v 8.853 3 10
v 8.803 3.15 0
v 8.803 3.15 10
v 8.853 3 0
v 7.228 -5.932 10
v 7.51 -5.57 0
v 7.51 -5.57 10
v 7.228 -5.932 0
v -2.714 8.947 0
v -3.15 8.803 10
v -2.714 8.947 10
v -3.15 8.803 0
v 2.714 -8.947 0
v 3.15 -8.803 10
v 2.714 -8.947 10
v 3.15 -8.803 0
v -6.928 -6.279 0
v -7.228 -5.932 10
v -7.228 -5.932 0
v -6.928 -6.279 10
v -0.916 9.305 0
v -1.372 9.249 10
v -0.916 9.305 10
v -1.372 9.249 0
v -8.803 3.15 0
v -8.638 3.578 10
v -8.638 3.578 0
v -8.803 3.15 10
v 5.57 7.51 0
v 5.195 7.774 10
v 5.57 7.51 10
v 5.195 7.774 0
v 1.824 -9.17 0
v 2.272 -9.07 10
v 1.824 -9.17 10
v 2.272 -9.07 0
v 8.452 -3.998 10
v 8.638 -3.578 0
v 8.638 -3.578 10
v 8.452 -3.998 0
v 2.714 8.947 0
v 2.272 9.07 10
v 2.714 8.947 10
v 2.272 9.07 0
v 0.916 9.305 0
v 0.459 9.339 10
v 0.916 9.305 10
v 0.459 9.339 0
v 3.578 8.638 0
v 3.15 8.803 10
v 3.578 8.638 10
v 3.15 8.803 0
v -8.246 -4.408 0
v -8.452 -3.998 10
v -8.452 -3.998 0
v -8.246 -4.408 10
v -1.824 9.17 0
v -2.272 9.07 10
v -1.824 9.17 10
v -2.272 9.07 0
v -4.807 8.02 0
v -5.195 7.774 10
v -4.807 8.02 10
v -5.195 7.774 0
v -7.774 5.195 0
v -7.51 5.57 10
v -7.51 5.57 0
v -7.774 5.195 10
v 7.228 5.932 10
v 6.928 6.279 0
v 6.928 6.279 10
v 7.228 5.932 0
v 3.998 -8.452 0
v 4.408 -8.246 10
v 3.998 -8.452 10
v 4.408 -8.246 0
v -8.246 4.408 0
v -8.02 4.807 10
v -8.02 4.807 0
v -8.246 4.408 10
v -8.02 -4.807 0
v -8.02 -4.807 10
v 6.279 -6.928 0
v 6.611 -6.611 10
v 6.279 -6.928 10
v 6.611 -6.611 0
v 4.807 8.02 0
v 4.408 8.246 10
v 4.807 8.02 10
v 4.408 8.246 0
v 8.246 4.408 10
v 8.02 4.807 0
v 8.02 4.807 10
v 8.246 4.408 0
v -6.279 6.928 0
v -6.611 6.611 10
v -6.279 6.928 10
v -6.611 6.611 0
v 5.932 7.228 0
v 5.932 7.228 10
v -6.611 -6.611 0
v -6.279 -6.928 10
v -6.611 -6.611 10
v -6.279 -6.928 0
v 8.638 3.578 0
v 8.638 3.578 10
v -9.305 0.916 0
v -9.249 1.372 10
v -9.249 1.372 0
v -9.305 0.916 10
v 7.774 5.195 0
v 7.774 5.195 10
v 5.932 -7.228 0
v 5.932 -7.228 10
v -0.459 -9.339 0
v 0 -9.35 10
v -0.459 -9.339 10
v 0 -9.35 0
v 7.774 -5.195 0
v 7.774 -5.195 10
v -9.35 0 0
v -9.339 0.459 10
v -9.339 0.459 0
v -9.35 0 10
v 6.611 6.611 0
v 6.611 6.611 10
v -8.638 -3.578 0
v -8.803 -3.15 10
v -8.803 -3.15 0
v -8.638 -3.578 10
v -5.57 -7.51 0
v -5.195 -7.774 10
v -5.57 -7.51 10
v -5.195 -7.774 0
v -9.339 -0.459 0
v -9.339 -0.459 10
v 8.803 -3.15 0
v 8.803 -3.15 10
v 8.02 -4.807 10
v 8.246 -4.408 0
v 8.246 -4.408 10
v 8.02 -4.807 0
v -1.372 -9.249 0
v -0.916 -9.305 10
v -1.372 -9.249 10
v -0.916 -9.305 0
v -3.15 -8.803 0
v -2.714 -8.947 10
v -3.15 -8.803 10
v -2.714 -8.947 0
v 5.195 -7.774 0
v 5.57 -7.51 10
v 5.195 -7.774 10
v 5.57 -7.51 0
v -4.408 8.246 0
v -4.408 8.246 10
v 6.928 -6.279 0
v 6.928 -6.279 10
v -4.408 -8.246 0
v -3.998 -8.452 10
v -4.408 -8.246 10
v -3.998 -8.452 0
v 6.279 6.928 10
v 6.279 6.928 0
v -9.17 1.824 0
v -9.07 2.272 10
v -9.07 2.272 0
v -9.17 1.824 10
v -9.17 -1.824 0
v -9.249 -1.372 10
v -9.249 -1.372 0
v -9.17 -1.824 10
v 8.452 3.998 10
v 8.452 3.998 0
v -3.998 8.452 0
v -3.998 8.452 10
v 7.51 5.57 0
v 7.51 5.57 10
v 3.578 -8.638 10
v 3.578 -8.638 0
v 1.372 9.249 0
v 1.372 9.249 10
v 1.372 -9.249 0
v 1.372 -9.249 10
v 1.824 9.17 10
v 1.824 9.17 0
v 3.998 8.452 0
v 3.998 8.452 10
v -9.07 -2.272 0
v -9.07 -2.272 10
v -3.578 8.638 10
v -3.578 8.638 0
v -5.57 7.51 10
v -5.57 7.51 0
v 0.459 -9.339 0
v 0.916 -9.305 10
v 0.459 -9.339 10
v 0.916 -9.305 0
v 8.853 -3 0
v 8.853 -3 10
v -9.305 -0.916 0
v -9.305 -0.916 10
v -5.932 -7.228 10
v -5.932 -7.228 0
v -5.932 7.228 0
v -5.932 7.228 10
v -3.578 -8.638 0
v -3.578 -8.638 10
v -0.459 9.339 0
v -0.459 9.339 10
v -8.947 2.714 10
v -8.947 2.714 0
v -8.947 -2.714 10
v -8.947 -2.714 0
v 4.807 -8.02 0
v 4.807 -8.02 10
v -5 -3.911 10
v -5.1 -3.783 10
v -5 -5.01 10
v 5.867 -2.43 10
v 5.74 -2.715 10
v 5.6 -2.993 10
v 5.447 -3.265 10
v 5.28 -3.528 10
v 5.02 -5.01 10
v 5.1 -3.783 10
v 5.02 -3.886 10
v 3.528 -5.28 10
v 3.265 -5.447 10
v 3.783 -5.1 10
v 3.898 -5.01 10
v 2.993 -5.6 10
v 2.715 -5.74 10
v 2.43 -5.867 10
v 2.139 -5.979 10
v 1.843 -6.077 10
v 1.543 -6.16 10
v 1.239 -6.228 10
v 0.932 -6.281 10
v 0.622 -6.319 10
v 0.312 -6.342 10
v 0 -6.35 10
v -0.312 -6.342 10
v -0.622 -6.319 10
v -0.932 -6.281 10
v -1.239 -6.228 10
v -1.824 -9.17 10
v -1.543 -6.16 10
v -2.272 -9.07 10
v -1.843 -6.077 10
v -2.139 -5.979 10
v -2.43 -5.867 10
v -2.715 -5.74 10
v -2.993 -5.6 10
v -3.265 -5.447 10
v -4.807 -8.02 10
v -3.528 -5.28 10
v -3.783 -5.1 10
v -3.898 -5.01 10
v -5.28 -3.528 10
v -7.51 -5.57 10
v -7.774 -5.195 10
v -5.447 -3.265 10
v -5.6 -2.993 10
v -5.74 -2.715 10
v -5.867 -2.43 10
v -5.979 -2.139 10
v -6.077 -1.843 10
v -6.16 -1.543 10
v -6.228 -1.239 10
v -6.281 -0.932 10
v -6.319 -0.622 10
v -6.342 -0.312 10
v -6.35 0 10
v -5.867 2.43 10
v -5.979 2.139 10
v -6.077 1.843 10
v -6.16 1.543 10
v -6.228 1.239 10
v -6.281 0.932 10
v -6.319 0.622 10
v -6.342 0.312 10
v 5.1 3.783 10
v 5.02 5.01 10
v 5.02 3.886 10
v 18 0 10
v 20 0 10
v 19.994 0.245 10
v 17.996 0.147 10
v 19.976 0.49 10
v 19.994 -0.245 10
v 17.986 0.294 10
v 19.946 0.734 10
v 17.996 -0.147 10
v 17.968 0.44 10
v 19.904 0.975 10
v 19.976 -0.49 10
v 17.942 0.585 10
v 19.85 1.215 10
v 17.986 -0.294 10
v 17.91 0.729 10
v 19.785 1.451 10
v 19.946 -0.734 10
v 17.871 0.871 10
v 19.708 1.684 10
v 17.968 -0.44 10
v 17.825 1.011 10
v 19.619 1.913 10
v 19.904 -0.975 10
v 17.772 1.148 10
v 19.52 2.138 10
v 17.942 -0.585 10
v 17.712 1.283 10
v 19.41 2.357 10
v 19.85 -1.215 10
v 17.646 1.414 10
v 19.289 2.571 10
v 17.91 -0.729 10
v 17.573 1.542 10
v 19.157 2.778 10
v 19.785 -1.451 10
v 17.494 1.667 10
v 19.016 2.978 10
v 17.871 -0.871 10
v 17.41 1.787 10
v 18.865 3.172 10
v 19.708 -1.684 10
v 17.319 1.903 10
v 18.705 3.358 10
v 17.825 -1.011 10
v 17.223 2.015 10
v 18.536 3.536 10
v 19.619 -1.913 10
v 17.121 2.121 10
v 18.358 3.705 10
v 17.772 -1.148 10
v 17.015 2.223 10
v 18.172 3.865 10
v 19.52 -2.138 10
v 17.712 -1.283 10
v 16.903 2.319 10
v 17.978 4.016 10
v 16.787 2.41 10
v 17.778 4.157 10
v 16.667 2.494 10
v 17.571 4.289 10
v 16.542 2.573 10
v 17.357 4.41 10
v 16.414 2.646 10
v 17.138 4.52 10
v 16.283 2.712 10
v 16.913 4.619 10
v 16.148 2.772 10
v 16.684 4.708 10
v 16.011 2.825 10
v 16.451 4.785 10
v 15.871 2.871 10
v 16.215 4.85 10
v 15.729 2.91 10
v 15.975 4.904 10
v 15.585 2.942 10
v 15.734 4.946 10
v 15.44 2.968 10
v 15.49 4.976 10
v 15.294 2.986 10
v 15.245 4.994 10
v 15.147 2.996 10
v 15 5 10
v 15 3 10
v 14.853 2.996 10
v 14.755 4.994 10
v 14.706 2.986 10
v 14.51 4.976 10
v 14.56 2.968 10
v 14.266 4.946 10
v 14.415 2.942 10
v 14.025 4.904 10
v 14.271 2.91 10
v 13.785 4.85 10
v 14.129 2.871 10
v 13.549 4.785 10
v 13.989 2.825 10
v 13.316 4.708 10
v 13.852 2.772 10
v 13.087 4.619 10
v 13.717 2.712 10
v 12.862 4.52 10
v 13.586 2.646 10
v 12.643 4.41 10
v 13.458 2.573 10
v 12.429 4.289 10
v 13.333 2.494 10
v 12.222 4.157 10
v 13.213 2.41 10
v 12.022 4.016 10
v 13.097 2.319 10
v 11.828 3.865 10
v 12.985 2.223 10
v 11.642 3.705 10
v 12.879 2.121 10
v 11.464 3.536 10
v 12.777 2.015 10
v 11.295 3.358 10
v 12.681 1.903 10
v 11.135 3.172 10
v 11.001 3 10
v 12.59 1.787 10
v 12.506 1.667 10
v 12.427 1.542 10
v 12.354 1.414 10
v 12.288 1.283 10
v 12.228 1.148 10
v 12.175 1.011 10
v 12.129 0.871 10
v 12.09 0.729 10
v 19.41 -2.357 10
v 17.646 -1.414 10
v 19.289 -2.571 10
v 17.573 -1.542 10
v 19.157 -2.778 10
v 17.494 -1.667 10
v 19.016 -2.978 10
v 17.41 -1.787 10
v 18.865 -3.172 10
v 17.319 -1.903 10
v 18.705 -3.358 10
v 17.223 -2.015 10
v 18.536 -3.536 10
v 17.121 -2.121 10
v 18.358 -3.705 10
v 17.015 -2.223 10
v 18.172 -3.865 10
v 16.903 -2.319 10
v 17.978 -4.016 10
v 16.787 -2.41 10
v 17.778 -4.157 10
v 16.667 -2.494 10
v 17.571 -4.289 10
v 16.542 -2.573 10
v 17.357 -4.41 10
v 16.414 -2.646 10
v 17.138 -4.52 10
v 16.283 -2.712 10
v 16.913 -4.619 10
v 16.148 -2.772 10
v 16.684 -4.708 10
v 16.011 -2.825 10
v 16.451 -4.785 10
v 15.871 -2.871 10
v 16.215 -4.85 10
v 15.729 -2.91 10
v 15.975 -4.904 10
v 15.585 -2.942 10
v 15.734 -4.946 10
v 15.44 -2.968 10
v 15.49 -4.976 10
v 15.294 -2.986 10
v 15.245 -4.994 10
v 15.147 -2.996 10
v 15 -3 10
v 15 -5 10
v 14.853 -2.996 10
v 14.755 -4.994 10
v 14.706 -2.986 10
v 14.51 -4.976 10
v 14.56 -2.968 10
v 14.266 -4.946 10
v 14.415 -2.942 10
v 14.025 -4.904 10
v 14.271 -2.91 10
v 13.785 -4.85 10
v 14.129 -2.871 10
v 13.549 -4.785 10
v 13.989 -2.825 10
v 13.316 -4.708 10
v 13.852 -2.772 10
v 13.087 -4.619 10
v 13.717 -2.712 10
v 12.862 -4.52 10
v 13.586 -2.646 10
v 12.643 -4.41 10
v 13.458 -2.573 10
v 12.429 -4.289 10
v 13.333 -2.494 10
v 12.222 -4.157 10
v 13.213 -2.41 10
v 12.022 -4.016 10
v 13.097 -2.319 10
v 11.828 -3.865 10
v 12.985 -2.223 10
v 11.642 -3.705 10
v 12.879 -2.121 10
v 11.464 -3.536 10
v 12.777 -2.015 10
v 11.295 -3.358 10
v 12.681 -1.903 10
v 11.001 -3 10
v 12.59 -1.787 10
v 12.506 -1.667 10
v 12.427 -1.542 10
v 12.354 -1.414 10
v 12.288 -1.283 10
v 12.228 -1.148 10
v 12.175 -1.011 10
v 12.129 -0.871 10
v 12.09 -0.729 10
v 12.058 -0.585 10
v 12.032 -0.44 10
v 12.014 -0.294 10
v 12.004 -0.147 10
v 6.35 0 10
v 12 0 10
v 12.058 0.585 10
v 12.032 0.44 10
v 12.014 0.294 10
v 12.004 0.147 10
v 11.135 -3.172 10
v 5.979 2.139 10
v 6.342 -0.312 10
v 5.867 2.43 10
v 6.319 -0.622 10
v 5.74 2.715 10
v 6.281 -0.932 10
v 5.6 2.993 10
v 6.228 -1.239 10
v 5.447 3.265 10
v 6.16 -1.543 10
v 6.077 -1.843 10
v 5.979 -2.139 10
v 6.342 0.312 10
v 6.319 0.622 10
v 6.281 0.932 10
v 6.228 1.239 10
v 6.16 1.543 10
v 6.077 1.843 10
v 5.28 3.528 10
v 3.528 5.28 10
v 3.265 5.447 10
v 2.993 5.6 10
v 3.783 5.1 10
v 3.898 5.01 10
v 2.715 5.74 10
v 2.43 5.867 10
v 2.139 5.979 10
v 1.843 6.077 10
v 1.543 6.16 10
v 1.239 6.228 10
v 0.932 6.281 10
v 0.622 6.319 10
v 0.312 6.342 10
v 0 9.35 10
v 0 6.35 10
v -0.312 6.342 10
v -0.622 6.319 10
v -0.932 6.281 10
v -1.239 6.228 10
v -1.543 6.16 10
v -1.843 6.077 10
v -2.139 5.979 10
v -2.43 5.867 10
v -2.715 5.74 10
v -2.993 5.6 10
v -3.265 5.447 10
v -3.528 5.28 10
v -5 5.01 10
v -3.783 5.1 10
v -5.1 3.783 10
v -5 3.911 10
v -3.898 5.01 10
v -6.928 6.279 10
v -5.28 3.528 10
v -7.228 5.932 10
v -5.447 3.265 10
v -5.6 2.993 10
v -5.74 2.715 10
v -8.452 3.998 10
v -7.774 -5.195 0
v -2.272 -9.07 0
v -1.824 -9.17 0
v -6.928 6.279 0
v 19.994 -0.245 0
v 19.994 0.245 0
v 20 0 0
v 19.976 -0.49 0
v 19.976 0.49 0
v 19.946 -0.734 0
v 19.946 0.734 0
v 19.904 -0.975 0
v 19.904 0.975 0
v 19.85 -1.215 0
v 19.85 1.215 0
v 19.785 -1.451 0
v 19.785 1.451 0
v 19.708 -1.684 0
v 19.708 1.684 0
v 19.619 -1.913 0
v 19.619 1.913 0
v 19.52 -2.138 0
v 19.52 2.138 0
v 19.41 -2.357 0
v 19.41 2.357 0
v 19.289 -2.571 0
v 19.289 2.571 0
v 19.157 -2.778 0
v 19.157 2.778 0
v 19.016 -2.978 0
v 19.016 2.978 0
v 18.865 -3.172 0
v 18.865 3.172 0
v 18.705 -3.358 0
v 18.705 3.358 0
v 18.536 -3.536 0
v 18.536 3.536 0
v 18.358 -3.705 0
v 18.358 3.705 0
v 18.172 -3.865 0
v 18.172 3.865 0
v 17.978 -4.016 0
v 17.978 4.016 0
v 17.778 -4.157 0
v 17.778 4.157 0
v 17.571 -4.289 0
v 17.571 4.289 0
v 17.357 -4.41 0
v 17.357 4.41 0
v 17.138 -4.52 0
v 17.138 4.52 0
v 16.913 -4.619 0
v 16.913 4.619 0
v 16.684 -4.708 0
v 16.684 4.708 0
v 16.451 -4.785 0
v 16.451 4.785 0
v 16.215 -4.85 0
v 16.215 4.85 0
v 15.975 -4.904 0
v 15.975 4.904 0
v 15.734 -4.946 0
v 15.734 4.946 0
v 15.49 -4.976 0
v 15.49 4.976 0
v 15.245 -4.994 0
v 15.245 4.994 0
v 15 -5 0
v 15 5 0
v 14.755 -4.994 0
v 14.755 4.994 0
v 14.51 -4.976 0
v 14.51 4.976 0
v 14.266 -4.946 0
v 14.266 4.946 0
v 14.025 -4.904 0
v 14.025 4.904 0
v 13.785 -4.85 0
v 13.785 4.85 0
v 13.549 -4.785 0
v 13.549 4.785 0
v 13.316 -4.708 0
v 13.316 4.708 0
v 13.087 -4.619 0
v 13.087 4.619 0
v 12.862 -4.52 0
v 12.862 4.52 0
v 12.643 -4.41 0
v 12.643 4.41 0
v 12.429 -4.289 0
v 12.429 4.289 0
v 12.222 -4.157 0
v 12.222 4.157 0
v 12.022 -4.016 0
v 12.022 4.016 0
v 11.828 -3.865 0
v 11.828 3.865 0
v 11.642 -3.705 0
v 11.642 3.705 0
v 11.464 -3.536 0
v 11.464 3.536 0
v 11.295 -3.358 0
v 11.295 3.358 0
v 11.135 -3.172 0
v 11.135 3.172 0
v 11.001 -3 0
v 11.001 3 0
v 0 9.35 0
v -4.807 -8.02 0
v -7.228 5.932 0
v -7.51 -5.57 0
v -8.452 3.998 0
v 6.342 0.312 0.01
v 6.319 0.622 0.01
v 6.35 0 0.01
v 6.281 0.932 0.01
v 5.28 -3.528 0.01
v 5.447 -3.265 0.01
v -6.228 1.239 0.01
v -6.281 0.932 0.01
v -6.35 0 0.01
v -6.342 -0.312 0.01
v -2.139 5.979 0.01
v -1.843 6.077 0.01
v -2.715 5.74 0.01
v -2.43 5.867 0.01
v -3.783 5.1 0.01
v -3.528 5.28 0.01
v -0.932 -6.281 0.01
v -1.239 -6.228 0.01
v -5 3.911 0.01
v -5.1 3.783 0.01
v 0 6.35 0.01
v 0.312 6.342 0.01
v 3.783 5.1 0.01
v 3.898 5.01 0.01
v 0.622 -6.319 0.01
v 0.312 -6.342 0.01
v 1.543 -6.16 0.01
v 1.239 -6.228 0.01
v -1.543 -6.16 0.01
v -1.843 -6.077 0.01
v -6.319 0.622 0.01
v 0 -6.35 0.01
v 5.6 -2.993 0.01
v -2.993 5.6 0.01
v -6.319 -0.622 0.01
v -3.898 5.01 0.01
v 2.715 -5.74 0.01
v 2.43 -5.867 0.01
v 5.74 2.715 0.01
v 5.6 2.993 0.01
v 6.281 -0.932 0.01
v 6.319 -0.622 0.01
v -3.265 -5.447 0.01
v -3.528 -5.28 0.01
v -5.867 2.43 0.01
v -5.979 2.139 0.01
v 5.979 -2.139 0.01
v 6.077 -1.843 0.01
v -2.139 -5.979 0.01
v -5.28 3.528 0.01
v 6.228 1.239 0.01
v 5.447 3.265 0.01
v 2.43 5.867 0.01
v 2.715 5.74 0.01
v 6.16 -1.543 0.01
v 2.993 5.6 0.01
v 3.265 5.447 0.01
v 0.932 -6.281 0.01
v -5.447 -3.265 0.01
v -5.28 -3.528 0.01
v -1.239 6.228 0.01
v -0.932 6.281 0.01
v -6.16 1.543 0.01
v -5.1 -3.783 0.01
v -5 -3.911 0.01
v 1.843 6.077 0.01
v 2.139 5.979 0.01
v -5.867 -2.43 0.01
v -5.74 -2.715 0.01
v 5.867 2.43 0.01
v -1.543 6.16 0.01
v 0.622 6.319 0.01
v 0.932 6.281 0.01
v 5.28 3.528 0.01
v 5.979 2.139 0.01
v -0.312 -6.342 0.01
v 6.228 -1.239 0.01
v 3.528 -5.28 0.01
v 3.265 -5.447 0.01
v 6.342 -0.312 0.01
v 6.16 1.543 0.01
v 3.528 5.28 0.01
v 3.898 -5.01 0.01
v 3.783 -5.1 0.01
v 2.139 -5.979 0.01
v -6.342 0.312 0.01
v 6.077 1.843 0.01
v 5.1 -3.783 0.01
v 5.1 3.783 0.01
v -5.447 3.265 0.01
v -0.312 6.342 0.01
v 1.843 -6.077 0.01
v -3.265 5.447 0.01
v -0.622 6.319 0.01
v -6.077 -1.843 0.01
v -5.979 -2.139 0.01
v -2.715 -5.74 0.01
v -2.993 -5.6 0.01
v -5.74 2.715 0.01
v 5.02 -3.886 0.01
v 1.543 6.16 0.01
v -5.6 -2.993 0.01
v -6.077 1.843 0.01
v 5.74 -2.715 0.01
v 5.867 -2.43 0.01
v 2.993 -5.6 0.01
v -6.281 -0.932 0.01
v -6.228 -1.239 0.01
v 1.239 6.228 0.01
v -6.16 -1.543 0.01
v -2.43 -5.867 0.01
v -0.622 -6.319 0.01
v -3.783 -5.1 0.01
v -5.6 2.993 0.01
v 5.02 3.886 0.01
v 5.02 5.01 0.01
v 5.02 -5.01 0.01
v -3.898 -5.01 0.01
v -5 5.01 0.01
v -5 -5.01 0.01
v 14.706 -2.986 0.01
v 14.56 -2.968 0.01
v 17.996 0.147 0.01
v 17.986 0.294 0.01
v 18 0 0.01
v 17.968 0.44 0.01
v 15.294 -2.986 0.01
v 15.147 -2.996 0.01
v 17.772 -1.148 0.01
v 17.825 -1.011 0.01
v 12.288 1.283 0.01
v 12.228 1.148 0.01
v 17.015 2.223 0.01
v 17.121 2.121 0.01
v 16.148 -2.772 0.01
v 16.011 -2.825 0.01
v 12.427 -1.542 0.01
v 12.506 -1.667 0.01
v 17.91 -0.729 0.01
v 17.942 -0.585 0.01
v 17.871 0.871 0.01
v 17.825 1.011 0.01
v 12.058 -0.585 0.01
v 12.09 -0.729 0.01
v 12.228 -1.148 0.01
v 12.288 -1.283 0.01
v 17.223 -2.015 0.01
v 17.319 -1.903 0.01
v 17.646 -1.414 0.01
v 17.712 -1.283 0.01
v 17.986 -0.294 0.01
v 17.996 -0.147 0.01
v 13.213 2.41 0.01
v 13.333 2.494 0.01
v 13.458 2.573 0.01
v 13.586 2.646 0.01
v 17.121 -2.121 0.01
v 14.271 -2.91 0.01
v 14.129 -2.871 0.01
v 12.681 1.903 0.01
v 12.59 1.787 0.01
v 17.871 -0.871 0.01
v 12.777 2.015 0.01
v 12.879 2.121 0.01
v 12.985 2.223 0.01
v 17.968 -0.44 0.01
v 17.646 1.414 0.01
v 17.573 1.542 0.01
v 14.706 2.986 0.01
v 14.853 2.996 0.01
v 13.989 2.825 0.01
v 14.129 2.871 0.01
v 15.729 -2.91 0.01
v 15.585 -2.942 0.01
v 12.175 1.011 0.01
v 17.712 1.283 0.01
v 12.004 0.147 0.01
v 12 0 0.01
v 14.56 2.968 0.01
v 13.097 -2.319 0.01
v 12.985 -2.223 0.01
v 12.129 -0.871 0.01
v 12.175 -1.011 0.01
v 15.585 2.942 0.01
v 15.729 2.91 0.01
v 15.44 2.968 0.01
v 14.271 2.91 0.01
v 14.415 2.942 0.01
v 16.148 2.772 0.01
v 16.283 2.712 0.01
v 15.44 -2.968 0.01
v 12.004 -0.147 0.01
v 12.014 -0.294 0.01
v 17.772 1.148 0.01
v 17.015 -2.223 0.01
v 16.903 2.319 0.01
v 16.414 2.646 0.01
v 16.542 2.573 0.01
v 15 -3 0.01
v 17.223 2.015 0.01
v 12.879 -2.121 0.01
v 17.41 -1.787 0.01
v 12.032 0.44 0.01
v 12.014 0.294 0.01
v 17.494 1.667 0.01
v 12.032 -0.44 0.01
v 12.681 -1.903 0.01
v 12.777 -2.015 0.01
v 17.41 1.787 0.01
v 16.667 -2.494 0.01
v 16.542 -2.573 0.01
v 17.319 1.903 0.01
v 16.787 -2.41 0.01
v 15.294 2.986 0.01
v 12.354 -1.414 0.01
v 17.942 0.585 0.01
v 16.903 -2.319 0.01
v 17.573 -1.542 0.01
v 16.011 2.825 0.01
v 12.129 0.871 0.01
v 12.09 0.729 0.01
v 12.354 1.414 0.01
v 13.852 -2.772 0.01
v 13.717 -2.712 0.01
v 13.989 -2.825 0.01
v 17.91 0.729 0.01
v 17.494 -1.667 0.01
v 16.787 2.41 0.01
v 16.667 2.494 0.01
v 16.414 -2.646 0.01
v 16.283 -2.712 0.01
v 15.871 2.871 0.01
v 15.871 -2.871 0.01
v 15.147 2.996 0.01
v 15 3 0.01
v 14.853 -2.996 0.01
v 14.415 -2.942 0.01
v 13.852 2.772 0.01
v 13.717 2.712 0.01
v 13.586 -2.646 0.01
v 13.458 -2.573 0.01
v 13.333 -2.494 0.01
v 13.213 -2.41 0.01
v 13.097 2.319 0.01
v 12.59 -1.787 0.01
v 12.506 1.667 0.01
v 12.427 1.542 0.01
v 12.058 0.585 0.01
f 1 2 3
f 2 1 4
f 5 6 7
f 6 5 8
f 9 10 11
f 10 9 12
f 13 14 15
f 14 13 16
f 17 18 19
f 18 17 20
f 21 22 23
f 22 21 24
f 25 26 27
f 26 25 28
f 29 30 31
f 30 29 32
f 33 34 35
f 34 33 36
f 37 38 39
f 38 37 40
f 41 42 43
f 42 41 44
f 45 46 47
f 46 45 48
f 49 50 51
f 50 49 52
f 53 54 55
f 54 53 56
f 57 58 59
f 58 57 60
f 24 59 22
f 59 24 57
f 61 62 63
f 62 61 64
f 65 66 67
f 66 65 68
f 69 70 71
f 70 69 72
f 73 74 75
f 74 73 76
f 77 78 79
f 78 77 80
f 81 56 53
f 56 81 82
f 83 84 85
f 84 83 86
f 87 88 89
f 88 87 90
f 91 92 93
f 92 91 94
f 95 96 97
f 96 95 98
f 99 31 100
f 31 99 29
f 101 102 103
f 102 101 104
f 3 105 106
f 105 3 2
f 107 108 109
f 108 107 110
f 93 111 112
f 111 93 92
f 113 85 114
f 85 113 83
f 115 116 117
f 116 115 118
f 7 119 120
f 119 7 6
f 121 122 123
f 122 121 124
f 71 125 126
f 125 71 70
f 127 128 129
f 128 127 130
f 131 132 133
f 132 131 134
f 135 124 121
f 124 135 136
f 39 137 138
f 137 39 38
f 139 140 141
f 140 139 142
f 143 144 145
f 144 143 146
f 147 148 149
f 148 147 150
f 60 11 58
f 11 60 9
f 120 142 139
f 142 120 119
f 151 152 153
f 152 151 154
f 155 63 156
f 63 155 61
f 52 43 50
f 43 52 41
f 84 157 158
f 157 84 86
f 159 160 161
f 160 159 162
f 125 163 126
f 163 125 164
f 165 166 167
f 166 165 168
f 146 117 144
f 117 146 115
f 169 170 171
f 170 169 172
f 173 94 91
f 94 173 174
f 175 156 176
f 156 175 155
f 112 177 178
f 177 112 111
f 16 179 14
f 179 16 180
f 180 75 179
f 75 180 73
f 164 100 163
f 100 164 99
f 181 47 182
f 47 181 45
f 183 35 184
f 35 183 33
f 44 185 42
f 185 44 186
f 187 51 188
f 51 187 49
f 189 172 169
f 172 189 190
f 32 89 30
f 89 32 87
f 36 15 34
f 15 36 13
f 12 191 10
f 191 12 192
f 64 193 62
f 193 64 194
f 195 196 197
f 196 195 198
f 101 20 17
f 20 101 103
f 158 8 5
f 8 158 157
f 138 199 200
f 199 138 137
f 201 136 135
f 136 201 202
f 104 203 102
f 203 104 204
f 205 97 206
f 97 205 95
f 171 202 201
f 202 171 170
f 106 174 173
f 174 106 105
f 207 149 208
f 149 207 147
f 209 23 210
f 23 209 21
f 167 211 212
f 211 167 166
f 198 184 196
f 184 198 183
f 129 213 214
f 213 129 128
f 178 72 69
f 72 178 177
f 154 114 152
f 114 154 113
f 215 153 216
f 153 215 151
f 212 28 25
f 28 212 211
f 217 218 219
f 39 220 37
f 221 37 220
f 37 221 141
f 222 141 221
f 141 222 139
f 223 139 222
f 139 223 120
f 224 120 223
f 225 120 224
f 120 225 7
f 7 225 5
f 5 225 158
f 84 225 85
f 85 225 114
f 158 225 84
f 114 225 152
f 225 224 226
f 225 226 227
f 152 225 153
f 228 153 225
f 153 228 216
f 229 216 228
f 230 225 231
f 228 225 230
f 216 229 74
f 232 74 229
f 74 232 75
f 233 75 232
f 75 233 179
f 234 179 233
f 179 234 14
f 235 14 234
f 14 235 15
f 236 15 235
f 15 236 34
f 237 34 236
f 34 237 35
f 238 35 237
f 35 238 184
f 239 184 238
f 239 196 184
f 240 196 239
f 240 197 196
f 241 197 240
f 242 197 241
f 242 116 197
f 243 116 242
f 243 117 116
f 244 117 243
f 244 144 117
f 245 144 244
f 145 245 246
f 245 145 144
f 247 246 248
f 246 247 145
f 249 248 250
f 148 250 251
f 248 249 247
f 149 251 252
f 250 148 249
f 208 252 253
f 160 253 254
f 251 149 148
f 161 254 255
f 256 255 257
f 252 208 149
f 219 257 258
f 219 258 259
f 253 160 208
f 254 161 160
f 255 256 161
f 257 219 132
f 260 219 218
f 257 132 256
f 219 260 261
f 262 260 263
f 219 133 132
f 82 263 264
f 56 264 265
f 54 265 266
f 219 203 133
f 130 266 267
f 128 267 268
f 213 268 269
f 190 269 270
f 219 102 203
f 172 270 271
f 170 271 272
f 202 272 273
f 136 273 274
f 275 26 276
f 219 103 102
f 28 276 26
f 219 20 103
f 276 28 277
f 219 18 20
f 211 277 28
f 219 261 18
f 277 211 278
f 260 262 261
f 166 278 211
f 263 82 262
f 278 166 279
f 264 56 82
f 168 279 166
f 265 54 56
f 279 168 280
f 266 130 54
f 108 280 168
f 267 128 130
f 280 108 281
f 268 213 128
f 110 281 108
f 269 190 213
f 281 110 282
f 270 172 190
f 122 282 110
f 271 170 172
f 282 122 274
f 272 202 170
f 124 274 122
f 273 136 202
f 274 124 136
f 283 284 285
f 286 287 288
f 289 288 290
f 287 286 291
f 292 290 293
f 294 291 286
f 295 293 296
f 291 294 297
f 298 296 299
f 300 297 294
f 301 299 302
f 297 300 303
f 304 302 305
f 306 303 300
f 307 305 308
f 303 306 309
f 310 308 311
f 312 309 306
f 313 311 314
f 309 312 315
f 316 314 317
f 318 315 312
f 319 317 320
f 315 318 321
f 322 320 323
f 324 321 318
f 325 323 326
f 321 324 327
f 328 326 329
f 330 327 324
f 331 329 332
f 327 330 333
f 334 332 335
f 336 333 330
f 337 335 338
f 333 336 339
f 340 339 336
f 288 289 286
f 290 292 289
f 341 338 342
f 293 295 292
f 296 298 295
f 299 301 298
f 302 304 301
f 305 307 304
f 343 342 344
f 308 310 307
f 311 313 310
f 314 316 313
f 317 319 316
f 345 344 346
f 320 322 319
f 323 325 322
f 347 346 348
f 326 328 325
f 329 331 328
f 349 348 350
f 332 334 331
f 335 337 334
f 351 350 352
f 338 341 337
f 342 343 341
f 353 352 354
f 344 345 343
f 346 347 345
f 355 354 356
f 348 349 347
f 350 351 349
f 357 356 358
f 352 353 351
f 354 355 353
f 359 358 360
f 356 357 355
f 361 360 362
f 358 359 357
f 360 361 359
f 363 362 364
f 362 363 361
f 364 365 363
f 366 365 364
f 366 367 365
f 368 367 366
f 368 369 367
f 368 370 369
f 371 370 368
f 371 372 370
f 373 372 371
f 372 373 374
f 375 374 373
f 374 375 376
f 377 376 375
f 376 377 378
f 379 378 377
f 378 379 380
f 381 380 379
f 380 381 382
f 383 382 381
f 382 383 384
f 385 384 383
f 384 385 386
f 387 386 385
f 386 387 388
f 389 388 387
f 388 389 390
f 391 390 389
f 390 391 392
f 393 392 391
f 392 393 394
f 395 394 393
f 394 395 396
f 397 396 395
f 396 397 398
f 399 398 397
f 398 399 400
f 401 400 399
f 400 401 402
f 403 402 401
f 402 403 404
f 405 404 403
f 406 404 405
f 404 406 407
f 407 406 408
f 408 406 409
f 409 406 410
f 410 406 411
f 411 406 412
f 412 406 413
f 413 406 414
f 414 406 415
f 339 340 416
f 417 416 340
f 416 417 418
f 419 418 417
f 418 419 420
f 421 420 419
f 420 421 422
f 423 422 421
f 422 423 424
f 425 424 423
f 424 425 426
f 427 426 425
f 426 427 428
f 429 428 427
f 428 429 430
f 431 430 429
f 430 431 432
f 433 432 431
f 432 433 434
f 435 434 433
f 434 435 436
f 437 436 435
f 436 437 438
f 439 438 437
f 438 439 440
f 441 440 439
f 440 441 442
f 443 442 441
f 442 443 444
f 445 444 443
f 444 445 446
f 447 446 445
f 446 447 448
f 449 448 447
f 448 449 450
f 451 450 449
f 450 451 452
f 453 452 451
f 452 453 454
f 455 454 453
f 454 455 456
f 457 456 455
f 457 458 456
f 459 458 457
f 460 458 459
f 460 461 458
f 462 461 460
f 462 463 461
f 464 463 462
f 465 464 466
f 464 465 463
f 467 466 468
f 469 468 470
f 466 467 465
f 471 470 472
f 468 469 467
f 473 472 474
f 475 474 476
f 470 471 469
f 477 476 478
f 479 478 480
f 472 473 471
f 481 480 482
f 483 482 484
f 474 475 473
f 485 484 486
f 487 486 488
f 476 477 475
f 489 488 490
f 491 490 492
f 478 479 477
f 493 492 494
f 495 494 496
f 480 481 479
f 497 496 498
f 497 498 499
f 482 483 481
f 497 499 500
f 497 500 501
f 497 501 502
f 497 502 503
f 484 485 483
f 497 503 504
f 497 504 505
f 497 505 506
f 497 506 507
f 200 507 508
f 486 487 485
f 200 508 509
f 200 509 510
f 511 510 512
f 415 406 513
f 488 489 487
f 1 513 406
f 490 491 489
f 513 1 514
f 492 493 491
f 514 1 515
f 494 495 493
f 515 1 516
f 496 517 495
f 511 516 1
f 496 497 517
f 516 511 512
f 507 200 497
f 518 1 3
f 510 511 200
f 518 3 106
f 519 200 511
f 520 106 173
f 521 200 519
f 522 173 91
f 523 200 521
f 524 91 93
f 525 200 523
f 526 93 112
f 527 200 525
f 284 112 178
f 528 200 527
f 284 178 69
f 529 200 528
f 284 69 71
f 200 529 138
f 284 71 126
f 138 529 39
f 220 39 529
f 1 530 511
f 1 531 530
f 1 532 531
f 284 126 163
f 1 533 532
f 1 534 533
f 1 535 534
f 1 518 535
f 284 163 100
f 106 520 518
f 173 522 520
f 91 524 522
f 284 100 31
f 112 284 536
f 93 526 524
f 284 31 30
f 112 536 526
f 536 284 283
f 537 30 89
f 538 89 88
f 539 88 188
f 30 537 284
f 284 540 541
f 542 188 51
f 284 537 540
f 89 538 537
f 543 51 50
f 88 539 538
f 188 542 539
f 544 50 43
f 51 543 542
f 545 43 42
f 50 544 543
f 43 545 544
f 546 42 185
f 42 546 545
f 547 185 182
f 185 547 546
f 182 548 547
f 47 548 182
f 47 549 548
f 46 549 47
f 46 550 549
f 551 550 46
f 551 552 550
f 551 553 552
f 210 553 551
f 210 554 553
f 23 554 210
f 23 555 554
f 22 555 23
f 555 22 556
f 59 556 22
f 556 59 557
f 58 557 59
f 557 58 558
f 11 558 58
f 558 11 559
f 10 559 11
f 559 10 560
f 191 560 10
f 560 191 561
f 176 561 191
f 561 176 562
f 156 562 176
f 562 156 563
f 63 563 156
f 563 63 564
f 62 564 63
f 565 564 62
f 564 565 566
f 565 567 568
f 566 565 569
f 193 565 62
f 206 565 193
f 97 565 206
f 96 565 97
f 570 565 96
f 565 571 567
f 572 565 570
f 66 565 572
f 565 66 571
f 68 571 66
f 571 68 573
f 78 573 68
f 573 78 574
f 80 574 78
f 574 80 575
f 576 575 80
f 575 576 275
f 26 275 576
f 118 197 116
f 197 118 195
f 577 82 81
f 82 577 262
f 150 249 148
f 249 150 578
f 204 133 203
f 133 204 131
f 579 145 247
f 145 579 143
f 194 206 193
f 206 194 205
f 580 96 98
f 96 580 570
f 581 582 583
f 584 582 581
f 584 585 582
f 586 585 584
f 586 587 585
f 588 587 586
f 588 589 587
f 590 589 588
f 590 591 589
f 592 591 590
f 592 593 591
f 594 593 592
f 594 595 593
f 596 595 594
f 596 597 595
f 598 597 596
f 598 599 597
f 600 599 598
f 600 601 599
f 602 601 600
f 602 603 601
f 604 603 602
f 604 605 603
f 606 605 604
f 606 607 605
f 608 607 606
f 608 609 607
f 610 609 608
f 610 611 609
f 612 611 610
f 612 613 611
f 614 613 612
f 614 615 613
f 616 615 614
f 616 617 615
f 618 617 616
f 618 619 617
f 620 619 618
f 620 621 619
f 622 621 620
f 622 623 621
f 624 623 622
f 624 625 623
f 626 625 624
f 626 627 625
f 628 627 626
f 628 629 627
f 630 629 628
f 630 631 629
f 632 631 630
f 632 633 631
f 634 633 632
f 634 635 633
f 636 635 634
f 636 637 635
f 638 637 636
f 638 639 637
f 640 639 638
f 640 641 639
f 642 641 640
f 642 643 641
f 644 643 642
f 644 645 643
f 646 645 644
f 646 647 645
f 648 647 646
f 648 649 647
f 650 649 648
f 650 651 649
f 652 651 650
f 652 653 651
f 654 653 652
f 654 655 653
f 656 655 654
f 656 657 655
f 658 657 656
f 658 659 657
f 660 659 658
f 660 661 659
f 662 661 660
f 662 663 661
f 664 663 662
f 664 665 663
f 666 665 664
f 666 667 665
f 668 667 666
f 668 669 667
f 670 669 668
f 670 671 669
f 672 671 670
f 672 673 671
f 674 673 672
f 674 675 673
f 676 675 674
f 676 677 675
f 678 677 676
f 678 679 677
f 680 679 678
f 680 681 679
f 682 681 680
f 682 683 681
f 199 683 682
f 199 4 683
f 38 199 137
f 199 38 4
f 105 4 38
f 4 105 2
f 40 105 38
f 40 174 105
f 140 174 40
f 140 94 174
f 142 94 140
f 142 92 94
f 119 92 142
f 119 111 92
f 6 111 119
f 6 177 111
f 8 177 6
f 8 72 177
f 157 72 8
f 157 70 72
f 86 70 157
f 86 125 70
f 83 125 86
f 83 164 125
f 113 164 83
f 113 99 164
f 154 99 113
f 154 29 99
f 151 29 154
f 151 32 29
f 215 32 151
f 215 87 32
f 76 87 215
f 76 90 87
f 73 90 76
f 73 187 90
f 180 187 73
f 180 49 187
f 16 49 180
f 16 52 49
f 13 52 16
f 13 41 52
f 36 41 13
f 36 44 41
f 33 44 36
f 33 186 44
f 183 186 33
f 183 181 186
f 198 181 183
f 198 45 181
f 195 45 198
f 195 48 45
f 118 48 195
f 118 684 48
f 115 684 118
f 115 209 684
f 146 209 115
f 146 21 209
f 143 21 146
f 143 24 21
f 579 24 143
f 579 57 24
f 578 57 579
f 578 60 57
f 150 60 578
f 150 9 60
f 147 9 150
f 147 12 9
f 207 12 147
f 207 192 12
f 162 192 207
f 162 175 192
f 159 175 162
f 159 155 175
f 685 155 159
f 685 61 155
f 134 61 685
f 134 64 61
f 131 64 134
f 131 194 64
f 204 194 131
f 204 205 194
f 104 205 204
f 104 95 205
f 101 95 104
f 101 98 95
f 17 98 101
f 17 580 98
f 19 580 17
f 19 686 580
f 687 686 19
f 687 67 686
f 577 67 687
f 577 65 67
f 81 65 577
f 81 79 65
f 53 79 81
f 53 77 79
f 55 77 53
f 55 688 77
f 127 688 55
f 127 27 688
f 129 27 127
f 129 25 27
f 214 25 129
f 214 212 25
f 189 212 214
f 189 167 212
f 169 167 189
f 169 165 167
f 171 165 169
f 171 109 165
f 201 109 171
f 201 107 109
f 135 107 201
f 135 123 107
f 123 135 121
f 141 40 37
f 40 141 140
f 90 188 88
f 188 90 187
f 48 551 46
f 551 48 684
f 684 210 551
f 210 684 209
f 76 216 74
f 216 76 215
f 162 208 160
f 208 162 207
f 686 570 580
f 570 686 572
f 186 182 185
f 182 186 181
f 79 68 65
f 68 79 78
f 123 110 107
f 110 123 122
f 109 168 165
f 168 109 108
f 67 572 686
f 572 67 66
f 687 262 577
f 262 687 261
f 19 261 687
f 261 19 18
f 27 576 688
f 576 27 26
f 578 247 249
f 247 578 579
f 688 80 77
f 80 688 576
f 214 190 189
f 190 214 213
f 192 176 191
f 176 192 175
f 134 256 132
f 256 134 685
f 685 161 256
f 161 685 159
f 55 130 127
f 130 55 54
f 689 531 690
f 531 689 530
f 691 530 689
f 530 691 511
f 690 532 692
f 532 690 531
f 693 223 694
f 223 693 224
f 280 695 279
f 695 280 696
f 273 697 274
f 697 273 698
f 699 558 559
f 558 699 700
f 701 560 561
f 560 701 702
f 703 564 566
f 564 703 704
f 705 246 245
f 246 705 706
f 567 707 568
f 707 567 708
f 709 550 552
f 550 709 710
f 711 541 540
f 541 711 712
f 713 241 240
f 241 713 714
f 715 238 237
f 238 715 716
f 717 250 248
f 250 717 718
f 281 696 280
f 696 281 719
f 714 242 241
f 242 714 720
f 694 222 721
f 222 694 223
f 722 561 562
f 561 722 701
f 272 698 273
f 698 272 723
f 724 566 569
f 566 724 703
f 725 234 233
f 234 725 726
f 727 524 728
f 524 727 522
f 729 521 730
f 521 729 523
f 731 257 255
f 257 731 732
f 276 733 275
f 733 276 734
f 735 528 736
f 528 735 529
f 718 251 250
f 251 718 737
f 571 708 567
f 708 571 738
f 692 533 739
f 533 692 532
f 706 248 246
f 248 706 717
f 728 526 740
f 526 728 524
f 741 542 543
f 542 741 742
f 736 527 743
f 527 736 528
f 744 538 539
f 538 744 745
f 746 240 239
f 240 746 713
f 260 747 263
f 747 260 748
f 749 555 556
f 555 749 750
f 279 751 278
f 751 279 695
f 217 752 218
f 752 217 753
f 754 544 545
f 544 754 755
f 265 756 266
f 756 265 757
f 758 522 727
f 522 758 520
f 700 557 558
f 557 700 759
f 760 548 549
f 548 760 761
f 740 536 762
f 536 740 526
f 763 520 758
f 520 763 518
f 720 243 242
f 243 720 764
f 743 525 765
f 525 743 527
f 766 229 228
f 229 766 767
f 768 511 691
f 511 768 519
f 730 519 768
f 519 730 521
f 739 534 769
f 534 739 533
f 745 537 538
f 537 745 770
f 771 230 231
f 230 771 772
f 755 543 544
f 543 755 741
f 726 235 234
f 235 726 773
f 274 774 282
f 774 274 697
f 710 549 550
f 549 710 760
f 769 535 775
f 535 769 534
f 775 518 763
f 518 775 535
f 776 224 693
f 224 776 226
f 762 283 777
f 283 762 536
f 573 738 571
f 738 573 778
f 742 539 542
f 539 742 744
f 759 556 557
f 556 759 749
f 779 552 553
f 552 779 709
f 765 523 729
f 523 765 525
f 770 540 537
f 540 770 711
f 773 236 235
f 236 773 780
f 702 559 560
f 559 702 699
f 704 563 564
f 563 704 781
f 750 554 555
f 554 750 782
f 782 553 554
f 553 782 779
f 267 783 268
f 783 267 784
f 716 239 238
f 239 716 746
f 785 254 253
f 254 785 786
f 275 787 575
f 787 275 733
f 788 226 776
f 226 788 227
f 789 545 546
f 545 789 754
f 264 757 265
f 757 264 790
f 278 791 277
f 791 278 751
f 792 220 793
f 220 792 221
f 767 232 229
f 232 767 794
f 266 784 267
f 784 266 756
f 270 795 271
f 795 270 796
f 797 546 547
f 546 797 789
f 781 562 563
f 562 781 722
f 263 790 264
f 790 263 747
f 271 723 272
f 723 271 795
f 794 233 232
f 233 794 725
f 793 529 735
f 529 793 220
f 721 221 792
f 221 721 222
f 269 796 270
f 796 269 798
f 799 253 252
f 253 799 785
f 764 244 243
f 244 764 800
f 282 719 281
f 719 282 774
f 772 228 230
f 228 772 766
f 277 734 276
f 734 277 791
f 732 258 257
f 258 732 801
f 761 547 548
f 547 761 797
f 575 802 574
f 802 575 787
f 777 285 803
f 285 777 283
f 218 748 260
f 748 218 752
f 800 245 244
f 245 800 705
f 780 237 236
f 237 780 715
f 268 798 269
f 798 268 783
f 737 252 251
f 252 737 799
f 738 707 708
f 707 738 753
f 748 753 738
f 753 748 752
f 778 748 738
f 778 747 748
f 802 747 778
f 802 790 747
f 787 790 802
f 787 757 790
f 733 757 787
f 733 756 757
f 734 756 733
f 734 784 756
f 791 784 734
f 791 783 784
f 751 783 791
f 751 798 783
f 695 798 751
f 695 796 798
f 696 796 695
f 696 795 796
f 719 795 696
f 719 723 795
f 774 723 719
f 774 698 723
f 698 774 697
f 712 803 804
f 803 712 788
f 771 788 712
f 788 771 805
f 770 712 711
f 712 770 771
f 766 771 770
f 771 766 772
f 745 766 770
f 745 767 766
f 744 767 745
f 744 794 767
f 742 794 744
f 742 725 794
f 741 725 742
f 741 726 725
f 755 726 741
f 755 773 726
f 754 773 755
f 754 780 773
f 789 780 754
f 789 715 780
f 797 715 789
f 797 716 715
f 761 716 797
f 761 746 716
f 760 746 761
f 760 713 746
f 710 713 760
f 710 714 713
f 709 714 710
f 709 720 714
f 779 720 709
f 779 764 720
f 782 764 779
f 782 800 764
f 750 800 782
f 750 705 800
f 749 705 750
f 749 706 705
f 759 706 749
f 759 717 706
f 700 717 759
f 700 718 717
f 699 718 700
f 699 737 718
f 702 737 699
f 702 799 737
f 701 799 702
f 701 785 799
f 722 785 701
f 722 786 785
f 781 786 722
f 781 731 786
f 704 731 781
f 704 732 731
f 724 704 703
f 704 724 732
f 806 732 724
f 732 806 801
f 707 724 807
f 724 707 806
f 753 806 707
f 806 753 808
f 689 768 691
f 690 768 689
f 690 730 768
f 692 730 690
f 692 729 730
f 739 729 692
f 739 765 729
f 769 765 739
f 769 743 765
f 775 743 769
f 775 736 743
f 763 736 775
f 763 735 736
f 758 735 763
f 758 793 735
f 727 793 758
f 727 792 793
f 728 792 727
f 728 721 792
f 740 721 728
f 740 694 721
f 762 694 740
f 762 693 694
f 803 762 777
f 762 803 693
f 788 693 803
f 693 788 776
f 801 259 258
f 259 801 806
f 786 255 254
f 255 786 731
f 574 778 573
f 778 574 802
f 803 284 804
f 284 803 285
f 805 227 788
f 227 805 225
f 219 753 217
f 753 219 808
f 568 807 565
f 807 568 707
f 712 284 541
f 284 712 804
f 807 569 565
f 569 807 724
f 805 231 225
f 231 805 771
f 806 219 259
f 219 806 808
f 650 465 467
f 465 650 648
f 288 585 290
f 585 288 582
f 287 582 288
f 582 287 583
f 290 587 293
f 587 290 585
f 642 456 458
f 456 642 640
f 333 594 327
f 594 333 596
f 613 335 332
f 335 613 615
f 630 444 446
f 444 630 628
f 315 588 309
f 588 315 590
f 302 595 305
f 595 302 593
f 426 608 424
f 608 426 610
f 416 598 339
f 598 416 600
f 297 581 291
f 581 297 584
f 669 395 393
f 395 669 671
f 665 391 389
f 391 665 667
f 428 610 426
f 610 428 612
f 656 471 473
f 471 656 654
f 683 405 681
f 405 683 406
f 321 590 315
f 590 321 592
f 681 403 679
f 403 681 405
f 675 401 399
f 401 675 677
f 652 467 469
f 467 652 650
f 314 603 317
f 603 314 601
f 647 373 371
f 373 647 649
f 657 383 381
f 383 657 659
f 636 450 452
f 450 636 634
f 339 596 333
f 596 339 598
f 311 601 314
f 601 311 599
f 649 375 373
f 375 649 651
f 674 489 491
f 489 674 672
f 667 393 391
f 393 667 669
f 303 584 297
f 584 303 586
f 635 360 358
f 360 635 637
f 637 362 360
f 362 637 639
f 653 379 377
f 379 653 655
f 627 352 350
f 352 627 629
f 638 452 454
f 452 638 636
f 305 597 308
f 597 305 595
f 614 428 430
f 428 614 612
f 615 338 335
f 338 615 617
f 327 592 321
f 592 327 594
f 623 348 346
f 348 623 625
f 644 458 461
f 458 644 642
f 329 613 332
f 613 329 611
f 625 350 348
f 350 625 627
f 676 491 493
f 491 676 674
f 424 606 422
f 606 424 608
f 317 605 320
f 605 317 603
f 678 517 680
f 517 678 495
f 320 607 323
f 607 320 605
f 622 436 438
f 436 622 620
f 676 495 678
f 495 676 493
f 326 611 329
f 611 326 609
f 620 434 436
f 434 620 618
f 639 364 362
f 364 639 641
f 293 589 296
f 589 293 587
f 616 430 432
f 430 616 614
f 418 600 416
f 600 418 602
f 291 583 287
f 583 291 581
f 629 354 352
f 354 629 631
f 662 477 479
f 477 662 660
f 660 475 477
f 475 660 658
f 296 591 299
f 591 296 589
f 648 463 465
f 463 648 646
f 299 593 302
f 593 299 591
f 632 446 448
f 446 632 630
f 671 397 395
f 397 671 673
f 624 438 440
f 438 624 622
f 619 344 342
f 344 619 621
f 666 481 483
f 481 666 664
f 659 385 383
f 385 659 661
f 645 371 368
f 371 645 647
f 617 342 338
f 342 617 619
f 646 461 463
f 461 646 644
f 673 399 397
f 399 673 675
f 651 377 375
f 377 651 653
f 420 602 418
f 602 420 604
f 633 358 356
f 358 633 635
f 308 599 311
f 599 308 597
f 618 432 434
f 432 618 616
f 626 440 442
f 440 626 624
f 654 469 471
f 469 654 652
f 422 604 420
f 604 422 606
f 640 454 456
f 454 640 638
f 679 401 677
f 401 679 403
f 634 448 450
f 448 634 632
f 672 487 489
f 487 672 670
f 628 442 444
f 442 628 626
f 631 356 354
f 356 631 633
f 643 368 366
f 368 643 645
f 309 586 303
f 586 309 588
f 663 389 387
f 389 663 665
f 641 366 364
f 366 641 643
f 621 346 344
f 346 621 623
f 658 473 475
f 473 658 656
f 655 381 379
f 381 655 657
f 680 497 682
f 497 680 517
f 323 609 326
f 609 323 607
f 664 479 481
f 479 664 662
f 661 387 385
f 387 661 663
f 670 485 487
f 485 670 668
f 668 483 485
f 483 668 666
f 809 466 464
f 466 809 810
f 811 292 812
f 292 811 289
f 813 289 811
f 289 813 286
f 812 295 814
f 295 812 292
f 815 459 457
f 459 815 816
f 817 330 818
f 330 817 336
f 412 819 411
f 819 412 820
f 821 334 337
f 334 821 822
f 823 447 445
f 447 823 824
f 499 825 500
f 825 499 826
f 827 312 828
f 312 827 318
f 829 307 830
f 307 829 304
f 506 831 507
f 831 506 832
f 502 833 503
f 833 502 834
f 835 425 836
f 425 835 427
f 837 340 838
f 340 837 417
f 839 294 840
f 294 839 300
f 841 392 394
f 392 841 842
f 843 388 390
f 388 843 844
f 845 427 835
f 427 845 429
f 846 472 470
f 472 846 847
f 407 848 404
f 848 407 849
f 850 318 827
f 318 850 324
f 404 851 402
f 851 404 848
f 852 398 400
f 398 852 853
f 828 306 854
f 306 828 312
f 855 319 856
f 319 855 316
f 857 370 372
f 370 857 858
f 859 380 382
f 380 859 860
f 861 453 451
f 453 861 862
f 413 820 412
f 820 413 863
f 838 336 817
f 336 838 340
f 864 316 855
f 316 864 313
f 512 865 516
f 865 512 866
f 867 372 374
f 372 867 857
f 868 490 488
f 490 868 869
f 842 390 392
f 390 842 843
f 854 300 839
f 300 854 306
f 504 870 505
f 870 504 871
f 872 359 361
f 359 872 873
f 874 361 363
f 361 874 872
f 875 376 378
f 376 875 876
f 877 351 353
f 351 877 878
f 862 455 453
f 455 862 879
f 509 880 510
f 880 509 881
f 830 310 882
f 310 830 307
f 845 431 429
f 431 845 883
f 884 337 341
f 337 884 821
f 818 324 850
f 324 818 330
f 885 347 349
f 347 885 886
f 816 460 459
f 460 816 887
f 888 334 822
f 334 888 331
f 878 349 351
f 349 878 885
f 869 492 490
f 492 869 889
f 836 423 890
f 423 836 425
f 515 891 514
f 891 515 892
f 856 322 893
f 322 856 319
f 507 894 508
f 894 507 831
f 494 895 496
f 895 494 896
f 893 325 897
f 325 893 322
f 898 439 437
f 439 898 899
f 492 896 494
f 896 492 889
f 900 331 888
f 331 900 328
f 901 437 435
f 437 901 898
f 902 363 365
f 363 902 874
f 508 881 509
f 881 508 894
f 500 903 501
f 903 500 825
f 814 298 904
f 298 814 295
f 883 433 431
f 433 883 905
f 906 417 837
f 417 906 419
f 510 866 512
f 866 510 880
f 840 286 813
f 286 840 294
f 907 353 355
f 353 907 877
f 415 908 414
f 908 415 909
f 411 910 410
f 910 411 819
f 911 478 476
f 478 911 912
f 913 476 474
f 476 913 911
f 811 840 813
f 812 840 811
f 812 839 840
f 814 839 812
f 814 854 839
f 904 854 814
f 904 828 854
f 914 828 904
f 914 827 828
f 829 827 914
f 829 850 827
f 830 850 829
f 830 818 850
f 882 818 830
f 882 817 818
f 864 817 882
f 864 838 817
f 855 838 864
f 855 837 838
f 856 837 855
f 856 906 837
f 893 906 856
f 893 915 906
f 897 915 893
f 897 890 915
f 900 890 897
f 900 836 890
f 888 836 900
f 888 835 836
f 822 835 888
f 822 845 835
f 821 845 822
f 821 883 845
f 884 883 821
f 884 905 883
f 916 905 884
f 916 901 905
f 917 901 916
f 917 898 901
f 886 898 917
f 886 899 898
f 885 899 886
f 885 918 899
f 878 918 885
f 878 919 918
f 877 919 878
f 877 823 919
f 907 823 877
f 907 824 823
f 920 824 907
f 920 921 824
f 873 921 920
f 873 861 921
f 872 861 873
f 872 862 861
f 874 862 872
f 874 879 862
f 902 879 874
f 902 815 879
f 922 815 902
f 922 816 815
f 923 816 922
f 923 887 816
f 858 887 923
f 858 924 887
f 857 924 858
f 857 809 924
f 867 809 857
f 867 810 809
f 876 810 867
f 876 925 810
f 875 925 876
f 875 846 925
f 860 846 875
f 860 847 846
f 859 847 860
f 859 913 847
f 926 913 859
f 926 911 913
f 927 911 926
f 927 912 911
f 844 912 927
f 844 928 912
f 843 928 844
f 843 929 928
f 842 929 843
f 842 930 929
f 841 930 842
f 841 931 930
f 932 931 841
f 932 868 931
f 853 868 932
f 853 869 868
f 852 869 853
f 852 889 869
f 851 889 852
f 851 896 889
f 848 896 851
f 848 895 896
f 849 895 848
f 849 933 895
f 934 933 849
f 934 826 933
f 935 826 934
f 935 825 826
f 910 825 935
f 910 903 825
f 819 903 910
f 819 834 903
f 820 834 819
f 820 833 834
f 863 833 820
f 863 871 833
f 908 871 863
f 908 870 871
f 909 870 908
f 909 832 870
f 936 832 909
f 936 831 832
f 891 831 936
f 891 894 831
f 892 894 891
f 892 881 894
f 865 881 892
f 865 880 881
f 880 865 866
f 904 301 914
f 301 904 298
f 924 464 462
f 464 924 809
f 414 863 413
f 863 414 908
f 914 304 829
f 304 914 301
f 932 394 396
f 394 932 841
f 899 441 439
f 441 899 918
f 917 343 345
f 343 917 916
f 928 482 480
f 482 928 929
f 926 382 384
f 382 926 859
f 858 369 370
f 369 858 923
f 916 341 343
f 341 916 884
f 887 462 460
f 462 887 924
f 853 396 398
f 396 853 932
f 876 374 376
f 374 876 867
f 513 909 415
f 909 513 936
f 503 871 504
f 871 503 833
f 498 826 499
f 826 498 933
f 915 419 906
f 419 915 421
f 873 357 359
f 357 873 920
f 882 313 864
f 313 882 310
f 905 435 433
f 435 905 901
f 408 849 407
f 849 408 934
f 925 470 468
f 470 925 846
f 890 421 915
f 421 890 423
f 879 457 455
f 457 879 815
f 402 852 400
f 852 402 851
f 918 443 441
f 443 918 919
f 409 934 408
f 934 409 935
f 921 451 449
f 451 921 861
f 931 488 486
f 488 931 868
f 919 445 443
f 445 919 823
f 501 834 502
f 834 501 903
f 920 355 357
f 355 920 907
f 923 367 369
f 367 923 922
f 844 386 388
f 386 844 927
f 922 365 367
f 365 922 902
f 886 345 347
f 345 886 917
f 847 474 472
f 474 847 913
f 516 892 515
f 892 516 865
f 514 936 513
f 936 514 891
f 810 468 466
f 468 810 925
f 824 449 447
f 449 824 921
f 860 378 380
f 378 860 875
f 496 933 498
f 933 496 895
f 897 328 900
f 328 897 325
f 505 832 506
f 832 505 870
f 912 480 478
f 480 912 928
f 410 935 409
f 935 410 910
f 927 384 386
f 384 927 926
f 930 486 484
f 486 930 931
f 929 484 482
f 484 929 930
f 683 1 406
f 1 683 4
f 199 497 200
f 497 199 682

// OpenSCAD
// Snap-on Clip for Lab Stand Rod and Tubing
// Orientation: Flat on XY plane, building up in +Z.
// Units: Millimetres.

// --- Dimensions ---
// Rod Stand Dimensions
$rod_diameter = 12.7;
$rod_wall_thickness = 3;
$rod_outer_diameter = $rod_diameter + 2 * $rod_wall_thickness; // 18.7
$rod_ring_height = 10;

// Tubing Dimensions
$tubing_diameter = 6;
$tubing_wall_thickness = 2;
$tubing_outer_diameter = $tubing_diameter + 2 * $tubing_wall_thickness; // 8
$tubing_ring_height = 10;

// Positioning
$rod_center_x = 0;
$rod_center_y = 0;
$tubing_center_x = 15;
$tubing_center_y = 0;

// Bridge Dimensions
$bridge_width_x = 4; // From x=8 to x=12
$bridge_width_y = 6;
$bridge_height = 10;

// Cutout Dimensions
$rod_cutout_width = 10;
$rod_cutout_height = 10; // -5 to 5
// FIX: The cutout must start at x=0 (center) and go to x=10.
// Previous logic started at -4.35, leaving a solid wall.
$rod_cutout_start_x = 0; 

$tubing_cutout_width = 4.5;
$tubing_cutout_height = 4.5; // -2.25 to 2.25
// Tubing cutout is on +X side relative to its center (15,0).
// So it starts at x=15 and goes to x=19.5.
$tubing_cutout_start_x = 15; 

// --- Configuration ---
$fn = 128; // High resolution for smooth curves

module rod_ring() {
    // Main Ring
    difference() {
        // Extrude the full outer circle
        translate([0, 0, 0])
            cylinder(h = $rod_ring_height, d = $rod_outer_diameter, $fn = $fn);
        
        // Inner Hole
        translate([0, 0, 0.01])
            cylinder(h = $rod_ring_height + 0.02, d = $rod_diameter, $fn = $fn);
        
        // Cutout on -X side (relative to global origin, this is the left side of the ring)
        // Specification: "everything with x < 0 and -5 < y < 5 is removed"
        // This means the cutout starts at x=0 and extends 10mm to the left (negative X).
        // Wait, re-reading spec: "10 mm wide opening cut out of its -X side".
        // If the ring is centered at 0, the -X side is the left side.
        // The region to remove is x < 0.
        // So the cutout box should cover x from -10 to 0.
        
        // Let's re-evaluate the geometry based on "x < 0".
        // If I remove x < 0, the remaining part is x >= 0.
        // The cutout box needs to cover the range [-10, 0] in X.
        // Center of box in X = -5. Width = 10.
        // Y range: -5 to 5. Center = 0. Height = 10.
        
        translate([
            -$rod_cutout_width / 2, // -5
            -$rod_cutout_height / 2 - 0.01, // -5.01
            0.01
        ])
            cube([
                $rod_cutout_width + 0.02, // 10.02
                $rod_cutout_height + 0.02, // 10.02
                $rod_ring_height + 0.02
            ]);
    }
}

module tubing_ring() {
    // Main Ring
    difference() {
        // Extrude the full outer circle
        translate([0, 0, 0])
            cylinder(h = $tubing_ring_height, d = $tubing_outer_diameter, $fn = $fn);
        
        // Inner Hole
        translate([0, 0, 0.01])
            cylinder(h = $tubing_ring_height + 0.02, d = $tubing_diameter, $fn = $fn);
        
        // Cutout on +X side
        // Specification: "x > 15 and -2.25 < y < 2.25"
        // This means the cutout starts at x=15 and extends 4.5mm to the right.
        // Box X range: [15, 19.5]. Center = 17.25.
        // Box Y range: [-2.25, 2.25]. Center = 0.
        
        translate([
            $tubing_cutout_start_x - ($tubing_cutout_width / 2), // 15 - 2.25 = 12.75
            -$tubing_cutout_height / 2 - 0.01, // -2.25 - 0.01
            0.01
        ])
            cube([
                $tubing_cutout_width + 0.02, // 4.52
                $tubing_cutout_height + 0.02, // 4.52
                $tubing_ring_height + 0.02
            ]);
    }
}

module bridge() {
    // Solid bridge between x=8 and x=12
    // Width in Y is 6mm.
    // Height is 10mm.
    translate([8, -3, 0])
        cube([4, 6, 10]);
}

// --- Main Assembly ---
difference() {
    union() {
        // 1. Rod Ring
        translate([$rod_center_x, $rod_center_y, 0])
            rod_ring();
        
        // 2. Tubing Ring
        translate([$tubing_center_x, $tubing_center_y, 0])
            tubing_ring();
        
        // 3. Bridge
        bridge();
    }
}
